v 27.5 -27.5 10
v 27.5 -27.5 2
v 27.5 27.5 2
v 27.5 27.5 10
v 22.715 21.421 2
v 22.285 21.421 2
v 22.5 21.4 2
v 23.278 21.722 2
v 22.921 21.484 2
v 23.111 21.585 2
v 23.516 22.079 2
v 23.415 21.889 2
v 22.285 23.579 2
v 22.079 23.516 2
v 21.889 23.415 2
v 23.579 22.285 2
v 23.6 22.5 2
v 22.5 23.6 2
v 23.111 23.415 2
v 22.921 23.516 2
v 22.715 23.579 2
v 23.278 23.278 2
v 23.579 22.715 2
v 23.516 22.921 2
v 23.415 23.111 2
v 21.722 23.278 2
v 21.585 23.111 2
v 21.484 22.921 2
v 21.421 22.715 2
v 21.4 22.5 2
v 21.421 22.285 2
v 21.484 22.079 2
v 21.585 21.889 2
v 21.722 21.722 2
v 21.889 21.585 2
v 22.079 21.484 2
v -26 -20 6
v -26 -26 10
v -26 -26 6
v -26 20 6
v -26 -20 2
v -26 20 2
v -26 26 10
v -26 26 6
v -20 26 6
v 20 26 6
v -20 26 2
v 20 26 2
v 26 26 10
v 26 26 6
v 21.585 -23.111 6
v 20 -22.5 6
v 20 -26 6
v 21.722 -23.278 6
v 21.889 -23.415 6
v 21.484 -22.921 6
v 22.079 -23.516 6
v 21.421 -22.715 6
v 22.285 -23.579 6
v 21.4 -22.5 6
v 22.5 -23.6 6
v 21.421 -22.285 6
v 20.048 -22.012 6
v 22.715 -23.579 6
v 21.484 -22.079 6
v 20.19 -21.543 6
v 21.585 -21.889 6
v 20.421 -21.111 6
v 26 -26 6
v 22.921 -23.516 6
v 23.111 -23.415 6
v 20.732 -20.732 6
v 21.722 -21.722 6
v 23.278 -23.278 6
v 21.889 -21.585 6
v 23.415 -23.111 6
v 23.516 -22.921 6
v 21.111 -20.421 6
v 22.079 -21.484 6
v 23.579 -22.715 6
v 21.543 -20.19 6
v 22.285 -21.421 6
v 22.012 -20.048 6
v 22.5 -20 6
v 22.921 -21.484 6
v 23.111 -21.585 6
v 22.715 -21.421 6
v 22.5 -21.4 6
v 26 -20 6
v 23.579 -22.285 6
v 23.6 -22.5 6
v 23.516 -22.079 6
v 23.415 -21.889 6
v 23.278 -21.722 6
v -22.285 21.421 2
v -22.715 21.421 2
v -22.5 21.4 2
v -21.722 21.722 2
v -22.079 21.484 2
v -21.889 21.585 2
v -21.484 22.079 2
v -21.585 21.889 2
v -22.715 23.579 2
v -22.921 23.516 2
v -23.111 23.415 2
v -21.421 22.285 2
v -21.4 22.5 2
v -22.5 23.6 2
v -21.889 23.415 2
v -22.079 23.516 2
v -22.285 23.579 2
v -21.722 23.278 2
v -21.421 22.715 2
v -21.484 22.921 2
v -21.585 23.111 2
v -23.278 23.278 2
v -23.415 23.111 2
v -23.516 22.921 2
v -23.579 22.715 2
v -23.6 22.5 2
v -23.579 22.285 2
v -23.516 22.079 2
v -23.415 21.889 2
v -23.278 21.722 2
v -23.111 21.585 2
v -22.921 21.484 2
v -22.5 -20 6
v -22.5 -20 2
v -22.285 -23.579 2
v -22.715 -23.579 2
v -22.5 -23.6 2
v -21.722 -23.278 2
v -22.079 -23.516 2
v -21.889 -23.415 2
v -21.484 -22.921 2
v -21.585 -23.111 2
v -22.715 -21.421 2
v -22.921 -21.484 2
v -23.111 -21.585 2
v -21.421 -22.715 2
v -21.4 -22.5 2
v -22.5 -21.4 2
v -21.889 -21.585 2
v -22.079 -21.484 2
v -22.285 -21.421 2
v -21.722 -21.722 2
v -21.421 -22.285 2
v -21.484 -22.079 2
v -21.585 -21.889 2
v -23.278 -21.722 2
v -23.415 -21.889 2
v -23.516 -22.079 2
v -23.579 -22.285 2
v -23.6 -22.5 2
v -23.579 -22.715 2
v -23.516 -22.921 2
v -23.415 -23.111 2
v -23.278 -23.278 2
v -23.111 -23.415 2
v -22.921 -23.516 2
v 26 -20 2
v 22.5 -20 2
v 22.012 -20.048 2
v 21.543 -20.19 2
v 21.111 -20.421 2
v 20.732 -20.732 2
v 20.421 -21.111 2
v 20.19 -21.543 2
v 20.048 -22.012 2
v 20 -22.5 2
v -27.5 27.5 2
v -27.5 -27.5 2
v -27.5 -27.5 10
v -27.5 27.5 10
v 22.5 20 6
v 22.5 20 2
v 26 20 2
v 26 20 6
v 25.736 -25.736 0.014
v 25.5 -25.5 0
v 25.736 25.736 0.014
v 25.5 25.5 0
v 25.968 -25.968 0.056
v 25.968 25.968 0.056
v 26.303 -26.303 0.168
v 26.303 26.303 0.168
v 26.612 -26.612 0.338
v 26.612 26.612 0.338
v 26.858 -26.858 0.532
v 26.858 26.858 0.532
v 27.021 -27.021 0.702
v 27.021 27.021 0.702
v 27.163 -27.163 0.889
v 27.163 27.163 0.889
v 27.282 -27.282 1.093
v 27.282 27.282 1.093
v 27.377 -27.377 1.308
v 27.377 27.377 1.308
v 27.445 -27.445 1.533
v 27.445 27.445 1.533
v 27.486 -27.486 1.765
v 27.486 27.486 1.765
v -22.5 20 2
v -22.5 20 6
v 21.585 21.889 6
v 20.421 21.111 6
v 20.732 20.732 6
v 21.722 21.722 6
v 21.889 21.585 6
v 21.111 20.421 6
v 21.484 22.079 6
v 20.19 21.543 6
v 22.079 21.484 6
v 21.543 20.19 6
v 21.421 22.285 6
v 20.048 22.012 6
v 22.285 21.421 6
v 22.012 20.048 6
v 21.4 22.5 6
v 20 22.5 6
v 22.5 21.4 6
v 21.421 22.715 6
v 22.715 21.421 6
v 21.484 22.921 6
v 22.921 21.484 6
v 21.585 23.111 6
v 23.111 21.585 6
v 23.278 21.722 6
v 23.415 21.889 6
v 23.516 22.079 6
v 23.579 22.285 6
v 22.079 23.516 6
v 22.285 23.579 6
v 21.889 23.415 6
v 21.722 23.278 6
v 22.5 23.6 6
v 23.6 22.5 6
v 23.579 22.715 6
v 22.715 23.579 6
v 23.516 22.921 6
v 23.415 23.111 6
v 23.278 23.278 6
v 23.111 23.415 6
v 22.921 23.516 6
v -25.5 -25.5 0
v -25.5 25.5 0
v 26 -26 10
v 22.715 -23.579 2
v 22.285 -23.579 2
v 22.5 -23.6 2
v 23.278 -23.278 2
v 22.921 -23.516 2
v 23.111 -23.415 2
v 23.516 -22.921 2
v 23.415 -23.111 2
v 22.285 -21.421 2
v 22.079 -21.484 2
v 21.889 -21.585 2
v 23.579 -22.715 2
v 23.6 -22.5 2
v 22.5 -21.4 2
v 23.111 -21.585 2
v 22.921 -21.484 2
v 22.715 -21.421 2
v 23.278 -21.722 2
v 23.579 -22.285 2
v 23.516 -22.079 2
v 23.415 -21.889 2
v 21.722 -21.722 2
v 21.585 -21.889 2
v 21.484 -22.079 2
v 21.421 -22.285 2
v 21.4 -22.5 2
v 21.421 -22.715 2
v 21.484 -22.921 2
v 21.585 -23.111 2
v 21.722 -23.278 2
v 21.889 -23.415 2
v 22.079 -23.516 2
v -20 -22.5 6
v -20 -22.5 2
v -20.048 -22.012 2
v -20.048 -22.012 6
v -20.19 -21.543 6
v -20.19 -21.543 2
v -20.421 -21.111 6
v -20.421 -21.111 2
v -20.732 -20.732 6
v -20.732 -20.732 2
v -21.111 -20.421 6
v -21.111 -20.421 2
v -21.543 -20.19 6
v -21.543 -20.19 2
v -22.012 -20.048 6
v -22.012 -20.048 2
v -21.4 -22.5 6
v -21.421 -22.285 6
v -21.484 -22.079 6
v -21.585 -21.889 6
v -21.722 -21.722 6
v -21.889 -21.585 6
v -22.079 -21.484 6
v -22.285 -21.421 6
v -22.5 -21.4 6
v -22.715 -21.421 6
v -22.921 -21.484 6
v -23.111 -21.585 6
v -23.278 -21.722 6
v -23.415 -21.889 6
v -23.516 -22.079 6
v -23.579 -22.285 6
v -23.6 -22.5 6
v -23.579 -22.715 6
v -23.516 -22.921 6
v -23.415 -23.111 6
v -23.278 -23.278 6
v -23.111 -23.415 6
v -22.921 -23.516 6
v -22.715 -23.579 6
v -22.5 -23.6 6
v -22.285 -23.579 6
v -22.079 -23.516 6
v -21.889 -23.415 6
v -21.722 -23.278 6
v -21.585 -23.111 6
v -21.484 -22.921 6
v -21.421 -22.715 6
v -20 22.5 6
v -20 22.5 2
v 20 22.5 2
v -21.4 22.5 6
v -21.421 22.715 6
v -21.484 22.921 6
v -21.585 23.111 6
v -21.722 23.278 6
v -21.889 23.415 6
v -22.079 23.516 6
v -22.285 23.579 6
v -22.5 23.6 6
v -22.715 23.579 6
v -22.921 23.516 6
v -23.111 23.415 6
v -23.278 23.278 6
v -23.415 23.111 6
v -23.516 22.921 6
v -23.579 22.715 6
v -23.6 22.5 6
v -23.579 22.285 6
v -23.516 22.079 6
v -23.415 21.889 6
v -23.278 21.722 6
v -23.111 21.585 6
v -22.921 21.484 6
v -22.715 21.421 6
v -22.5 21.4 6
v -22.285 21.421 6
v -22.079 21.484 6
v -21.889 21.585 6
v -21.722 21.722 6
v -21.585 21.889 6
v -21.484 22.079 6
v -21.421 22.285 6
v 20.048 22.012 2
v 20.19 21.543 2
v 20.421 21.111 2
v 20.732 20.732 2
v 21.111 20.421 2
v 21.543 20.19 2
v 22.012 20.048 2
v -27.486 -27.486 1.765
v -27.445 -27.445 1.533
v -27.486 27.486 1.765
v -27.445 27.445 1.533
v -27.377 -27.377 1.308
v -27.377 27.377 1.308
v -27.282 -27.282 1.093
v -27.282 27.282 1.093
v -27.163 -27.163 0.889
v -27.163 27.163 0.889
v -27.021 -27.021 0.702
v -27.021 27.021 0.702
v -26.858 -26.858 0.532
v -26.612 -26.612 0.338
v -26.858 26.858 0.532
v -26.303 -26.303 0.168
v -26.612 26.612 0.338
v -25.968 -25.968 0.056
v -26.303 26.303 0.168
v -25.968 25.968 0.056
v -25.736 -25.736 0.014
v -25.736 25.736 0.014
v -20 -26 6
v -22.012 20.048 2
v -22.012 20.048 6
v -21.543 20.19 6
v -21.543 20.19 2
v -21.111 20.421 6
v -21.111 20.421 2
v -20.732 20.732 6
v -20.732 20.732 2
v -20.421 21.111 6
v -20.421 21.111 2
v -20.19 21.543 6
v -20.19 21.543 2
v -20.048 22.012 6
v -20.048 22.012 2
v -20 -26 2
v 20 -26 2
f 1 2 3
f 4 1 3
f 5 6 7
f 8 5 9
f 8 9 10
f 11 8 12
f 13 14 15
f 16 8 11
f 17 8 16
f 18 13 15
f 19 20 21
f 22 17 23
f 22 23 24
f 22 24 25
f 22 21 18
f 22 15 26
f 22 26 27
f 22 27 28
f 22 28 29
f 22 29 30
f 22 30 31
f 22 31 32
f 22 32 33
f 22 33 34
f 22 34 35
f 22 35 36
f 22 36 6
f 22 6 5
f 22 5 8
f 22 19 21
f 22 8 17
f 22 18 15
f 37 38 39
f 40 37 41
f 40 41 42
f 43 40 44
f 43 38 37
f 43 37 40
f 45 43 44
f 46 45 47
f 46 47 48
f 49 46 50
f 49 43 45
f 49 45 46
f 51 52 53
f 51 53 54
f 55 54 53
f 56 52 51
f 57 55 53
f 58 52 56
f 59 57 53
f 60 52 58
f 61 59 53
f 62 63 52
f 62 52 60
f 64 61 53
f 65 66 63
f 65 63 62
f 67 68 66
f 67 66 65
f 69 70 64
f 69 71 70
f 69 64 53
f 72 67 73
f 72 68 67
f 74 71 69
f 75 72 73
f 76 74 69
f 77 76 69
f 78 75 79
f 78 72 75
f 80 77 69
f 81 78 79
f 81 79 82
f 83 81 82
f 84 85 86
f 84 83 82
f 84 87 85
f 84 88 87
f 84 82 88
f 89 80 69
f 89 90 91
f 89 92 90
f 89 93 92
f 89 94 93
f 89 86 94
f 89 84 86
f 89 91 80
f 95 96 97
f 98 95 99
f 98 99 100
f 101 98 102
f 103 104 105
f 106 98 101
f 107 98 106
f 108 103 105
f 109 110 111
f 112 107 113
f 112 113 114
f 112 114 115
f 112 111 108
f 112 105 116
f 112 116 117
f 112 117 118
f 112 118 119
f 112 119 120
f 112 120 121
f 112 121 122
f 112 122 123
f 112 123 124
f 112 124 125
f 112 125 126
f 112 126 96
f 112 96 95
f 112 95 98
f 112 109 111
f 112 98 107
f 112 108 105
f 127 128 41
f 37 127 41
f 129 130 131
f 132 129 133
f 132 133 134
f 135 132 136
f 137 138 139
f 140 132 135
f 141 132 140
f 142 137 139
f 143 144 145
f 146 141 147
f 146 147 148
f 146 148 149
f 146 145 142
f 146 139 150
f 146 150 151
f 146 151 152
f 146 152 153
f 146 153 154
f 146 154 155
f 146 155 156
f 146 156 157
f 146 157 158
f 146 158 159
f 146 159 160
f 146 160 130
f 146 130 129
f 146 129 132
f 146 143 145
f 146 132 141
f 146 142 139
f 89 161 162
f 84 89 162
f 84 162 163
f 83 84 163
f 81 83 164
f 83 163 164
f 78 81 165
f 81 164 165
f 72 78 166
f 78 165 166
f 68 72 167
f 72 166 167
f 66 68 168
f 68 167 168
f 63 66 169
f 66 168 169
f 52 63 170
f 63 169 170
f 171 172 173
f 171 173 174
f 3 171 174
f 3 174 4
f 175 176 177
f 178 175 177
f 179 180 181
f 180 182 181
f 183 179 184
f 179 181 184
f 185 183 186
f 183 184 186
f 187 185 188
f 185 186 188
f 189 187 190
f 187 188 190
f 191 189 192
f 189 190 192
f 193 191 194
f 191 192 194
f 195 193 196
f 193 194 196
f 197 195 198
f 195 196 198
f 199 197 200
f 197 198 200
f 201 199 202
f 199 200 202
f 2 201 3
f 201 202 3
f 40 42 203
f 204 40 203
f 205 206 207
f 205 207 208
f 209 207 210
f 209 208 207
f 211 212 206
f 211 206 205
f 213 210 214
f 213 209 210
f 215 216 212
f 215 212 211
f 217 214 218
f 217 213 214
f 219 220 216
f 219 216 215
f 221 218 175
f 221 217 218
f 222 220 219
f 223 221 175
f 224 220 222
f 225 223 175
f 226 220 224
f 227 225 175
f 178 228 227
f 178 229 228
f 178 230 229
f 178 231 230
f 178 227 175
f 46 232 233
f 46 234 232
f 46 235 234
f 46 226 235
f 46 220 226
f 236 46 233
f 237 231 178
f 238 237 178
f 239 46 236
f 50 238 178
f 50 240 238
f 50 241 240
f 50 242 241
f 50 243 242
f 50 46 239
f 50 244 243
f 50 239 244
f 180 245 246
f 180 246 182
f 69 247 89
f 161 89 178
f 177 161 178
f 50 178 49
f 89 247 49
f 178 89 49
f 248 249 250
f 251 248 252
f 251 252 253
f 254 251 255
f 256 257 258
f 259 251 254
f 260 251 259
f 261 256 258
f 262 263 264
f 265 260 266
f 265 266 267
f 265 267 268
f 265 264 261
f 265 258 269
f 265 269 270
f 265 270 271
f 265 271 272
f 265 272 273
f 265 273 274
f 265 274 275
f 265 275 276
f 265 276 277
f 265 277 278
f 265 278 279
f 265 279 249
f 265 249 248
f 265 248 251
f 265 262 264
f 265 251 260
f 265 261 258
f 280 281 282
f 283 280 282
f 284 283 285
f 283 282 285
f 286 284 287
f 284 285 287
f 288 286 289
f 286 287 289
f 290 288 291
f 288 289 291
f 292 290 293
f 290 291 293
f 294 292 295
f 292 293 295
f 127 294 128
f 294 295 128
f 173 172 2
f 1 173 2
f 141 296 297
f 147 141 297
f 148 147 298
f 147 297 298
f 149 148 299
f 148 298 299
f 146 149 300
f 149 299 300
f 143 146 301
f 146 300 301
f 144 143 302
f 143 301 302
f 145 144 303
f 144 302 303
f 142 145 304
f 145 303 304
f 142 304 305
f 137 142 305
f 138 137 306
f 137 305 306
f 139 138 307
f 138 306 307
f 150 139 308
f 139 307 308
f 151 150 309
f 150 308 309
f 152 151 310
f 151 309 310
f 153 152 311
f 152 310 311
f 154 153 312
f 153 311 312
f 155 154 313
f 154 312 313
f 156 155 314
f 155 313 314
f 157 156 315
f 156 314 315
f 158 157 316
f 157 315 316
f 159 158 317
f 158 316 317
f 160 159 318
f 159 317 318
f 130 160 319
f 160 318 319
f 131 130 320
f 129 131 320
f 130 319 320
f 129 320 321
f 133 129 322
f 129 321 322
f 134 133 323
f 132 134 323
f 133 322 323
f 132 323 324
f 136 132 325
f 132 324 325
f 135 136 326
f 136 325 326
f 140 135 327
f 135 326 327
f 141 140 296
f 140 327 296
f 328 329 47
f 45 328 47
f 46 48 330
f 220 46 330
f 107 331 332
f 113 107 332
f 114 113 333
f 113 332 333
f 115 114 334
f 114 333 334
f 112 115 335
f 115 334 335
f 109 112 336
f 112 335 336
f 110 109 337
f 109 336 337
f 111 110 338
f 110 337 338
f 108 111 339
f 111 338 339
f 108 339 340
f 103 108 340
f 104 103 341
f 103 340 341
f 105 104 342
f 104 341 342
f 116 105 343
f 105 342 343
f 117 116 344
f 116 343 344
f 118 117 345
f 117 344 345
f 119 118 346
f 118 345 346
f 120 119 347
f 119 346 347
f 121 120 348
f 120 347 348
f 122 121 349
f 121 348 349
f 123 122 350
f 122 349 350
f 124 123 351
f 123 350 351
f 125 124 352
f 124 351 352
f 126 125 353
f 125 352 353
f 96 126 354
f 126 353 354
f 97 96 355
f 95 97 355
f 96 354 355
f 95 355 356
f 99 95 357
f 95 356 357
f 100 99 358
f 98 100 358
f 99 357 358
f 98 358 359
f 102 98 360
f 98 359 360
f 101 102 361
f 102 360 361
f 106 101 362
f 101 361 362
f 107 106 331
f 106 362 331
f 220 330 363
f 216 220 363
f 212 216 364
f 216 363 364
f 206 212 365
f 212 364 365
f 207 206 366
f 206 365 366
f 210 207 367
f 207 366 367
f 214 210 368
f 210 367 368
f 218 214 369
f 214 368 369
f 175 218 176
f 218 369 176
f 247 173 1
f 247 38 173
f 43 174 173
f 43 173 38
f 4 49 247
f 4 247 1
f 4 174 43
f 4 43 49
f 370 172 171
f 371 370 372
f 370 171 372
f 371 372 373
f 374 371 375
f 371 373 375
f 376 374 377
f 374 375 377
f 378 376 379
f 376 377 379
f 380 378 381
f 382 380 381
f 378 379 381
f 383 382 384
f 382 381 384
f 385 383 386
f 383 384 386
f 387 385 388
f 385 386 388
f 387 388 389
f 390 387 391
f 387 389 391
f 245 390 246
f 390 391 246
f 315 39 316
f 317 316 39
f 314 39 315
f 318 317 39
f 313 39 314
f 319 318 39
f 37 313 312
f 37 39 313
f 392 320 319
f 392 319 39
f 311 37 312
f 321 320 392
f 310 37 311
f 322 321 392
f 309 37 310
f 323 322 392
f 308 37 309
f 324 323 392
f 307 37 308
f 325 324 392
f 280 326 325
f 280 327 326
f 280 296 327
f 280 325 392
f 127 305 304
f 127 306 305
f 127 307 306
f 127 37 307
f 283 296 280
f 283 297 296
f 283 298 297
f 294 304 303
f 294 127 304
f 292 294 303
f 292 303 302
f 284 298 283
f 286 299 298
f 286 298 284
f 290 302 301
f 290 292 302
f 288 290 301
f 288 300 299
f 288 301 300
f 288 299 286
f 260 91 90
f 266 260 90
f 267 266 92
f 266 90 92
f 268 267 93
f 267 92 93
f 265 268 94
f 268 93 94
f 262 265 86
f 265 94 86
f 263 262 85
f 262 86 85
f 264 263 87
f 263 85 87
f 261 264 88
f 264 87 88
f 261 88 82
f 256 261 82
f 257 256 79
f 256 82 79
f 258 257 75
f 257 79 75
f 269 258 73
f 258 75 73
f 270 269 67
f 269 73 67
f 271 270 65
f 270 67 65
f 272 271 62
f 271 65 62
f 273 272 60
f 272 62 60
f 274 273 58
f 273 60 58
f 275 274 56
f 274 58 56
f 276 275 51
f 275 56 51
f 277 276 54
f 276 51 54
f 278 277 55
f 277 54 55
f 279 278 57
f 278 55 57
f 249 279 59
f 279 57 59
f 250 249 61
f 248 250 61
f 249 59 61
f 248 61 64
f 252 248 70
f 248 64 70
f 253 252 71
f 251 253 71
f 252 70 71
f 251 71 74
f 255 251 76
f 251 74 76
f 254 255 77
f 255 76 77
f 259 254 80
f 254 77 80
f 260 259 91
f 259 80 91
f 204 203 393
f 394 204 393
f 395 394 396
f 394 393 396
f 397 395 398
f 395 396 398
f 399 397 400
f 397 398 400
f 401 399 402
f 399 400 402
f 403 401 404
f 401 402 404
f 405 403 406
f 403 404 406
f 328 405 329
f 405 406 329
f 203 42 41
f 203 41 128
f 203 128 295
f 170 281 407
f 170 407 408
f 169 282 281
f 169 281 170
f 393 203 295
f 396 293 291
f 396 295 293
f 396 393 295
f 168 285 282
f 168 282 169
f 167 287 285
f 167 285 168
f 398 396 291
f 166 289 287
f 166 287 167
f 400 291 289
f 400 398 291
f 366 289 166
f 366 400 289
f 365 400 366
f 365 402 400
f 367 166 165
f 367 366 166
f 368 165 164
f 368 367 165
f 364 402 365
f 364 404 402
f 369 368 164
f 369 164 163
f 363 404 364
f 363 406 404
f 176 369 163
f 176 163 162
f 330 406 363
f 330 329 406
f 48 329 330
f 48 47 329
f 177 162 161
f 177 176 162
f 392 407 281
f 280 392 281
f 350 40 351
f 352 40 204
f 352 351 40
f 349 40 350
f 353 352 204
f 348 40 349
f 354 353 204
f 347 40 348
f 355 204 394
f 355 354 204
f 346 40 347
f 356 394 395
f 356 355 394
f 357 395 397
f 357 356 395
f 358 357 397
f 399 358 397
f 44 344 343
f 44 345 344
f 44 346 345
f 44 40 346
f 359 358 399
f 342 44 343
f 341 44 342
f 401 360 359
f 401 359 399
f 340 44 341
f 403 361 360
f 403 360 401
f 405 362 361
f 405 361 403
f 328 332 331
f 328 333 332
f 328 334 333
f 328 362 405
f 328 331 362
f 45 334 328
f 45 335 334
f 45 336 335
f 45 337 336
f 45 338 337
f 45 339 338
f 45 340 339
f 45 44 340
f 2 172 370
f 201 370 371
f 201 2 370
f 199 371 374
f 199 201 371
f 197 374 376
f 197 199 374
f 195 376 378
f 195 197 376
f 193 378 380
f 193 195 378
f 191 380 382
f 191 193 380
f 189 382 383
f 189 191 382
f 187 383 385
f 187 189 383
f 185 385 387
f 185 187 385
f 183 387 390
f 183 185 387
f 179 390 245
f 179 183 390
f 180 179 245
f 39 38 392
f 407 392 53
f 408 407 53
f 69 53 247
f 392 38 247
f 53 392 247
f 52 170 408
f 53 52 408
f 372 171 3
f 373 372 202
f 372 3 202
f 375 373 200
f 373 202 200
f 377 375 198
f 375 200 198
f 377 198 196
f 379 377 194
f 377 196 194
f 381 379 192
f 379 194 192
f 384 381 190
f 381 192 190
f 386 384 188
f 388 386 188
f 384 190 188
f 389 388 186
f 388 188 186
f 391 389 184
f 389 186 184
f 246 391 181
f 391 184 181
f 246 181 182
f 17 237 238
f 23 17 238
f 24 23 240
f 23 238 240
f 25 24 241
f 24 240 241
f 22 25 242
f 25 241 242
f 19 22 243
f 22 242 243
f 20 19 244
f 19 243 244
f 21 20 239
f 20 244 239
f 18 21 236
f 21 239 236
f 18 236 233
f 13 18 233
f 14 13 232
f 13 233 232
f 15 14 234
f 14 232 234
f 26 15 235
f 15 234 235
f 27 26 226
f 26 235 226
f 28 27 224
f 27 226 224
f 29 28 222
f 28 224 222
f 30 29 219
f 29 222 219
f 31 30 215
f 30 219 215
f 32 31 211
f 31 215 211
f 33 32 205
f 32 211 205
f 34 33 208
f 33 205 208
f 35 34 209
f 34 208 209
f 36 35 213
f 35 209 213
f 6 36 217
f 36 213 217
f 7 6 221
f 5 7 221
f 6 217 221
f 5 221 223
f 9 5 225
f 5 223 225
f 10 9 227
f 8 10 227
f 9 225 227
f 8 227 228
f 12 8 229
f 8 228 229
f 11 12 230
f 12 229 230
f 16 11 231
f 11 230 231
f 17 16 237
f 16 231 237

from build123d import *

# Parameters (mm, degrees)
SKETCH_1_W          = 55
SKETCH_1_H          = 55
EXTRUDE_1_DEPTH     = 10
SKETCH_2_W          = 52
SKETCH_2_H          = 52
CUT_EXTRUDE_1_DEPTH = 8
FILLET_1_R          = 2
SKETCH_3_R          = 2.5
EXTRUDE_2_DEPTH     = 4
SKETCH_5_R          = 1.1
CUT_EXTRUDE_2_DEPTH = 4
EXTRUDE_4_DEPTH     = 4
EXTRUDE_6_DEPTH     = 4


with BuildPart() as part:
    # 草图1 → 凸台-拉伸1 (new body)
    with BuildSketch(Plane.XY):
        Rectangle(SKETCH_1_W, SKETCH_1_H)
    extrude(amount=EXTRUDE_1_DEPTH)

    # 草图2 → 切除-拉伸1 (cut)
    with BuildSketch(Plane.XY.offset(10)):
        Rectangle(SKETCH_2_W, SKETCH_2_H)
    extrude(amount=-CUT_EXTRUDE_1_DEPTH, mode=Mode.SUBTRACT)

    # 圆角1
    fillet_1_edges = [part.edges().sort_by_distance(p)[0] for p in [
        (0, -27.5, 0),
        (-27.5, 0, 0),
        (0, 27.5, 0),
        (27.5, 0, 0),
    ]]
    fillet(fillet_1_edges, radius=FILLET_1_R)

    # 草图3 → 凸台-拉伸2 (add)
    with BuildSketch(Plane.XY.offset(2)):
        with Locations((-22.5, 22.5)):
            Circle(SKETCH_3_R)
        with Locations((22.5, 22.5)):
            Circle(SKETCH_3_R)
        with Locations((-22.5, -22.5)):
            Circle(SKETCH_3_R)
        with Locations((22.5, -22.5)):
            Circle(SKETCH_3_R)
    extrude(amount=EXTRUDE_2_DEPTH)

    # 草图5 → 切除-拉伸2 (cut)
    with BuildSketch(Plane.XY.offset(6)):
        with Locations((-22.5, -22.5)):
            Circle(SKETCH_5_R)
        with Locations((22.5, -22.5)):
            Circle(SKETCH_5_R)
        with Locations((-22.5, 22.5)):
            Circle(SKETCH_5_R)
        with Locations((22.5, 22.5)):
            Circle(SKETCH_5_R)
    extrude(amount=-CUT_EXTRUDE_2_DEPTH, mode=Mode.SUBTRACT)

    # 草图6 → 凸台-拉伸4 (add)
    with BuildSketch(Plane.XY.offset(2)):
        with BuildLine():
            ThreePointArc((-22.5, 20), (-25, 22.5), (-22.5, 25))
            Line((-22.5, 25), (-26, 25))
            Line((-26, 25), (-26, 20))
            Line((-26, 20), (-22.5, 20))
        make_face()
    extrude(amount=EXTRUDE_4_DEPTH)

    # 草图13 → 凸台-拉伸6 (add)
    with BuildSketch(Plane.XY.offset(2)):
        with BuildLine():
            ThreePointArc((-22.5, 25), (-20.732233047, 24.267766953), (-20, 22.5))
            Line((-20, 22.5), (-20, 26))
            Line((-20, 26), (-26, 26))
            Line((-26, 26), (-26, 25))
            Line((-26, 25), (-22.5, 25))
        make_face()
        with BuildLine():
            ThreePointArc((-20, -22.5), (-24.267766953, -24.267766953), (-22.5, -20))
            Line((-22.5, -20), (-26, -20))
            Line((-26, -20), (-26, -26))
            Line((-26, -26), (-20, -26))
            Line((-20, -26), (-20, -22.5))
        make_face()
        with BuildLine():
            Line((26, -20), (22.5, -20))
            ThreePointArc((22.5, -20), (24.267766953, -24.267766953), (20, -22.5))
            Line((20, -22.5), (20, -26))
            Line((20, -26), (26, -26))
            Line((26, -26), (26, -20))
        make_face()
        with BuildLine():
            Line((20, 26), (20, 22.5))
            ThreePointArc((20, 22.5), (24.267766953, 24.267766953), (22.5, 20))
            Line((22.5, 20), (26, 20))
            Line((26, 20), (26, 26))
            Line((26, 26), (20, 26))
        make_face()
    extrude(amount=EXTRUDE_6_DEPTH)


solid = part.part
